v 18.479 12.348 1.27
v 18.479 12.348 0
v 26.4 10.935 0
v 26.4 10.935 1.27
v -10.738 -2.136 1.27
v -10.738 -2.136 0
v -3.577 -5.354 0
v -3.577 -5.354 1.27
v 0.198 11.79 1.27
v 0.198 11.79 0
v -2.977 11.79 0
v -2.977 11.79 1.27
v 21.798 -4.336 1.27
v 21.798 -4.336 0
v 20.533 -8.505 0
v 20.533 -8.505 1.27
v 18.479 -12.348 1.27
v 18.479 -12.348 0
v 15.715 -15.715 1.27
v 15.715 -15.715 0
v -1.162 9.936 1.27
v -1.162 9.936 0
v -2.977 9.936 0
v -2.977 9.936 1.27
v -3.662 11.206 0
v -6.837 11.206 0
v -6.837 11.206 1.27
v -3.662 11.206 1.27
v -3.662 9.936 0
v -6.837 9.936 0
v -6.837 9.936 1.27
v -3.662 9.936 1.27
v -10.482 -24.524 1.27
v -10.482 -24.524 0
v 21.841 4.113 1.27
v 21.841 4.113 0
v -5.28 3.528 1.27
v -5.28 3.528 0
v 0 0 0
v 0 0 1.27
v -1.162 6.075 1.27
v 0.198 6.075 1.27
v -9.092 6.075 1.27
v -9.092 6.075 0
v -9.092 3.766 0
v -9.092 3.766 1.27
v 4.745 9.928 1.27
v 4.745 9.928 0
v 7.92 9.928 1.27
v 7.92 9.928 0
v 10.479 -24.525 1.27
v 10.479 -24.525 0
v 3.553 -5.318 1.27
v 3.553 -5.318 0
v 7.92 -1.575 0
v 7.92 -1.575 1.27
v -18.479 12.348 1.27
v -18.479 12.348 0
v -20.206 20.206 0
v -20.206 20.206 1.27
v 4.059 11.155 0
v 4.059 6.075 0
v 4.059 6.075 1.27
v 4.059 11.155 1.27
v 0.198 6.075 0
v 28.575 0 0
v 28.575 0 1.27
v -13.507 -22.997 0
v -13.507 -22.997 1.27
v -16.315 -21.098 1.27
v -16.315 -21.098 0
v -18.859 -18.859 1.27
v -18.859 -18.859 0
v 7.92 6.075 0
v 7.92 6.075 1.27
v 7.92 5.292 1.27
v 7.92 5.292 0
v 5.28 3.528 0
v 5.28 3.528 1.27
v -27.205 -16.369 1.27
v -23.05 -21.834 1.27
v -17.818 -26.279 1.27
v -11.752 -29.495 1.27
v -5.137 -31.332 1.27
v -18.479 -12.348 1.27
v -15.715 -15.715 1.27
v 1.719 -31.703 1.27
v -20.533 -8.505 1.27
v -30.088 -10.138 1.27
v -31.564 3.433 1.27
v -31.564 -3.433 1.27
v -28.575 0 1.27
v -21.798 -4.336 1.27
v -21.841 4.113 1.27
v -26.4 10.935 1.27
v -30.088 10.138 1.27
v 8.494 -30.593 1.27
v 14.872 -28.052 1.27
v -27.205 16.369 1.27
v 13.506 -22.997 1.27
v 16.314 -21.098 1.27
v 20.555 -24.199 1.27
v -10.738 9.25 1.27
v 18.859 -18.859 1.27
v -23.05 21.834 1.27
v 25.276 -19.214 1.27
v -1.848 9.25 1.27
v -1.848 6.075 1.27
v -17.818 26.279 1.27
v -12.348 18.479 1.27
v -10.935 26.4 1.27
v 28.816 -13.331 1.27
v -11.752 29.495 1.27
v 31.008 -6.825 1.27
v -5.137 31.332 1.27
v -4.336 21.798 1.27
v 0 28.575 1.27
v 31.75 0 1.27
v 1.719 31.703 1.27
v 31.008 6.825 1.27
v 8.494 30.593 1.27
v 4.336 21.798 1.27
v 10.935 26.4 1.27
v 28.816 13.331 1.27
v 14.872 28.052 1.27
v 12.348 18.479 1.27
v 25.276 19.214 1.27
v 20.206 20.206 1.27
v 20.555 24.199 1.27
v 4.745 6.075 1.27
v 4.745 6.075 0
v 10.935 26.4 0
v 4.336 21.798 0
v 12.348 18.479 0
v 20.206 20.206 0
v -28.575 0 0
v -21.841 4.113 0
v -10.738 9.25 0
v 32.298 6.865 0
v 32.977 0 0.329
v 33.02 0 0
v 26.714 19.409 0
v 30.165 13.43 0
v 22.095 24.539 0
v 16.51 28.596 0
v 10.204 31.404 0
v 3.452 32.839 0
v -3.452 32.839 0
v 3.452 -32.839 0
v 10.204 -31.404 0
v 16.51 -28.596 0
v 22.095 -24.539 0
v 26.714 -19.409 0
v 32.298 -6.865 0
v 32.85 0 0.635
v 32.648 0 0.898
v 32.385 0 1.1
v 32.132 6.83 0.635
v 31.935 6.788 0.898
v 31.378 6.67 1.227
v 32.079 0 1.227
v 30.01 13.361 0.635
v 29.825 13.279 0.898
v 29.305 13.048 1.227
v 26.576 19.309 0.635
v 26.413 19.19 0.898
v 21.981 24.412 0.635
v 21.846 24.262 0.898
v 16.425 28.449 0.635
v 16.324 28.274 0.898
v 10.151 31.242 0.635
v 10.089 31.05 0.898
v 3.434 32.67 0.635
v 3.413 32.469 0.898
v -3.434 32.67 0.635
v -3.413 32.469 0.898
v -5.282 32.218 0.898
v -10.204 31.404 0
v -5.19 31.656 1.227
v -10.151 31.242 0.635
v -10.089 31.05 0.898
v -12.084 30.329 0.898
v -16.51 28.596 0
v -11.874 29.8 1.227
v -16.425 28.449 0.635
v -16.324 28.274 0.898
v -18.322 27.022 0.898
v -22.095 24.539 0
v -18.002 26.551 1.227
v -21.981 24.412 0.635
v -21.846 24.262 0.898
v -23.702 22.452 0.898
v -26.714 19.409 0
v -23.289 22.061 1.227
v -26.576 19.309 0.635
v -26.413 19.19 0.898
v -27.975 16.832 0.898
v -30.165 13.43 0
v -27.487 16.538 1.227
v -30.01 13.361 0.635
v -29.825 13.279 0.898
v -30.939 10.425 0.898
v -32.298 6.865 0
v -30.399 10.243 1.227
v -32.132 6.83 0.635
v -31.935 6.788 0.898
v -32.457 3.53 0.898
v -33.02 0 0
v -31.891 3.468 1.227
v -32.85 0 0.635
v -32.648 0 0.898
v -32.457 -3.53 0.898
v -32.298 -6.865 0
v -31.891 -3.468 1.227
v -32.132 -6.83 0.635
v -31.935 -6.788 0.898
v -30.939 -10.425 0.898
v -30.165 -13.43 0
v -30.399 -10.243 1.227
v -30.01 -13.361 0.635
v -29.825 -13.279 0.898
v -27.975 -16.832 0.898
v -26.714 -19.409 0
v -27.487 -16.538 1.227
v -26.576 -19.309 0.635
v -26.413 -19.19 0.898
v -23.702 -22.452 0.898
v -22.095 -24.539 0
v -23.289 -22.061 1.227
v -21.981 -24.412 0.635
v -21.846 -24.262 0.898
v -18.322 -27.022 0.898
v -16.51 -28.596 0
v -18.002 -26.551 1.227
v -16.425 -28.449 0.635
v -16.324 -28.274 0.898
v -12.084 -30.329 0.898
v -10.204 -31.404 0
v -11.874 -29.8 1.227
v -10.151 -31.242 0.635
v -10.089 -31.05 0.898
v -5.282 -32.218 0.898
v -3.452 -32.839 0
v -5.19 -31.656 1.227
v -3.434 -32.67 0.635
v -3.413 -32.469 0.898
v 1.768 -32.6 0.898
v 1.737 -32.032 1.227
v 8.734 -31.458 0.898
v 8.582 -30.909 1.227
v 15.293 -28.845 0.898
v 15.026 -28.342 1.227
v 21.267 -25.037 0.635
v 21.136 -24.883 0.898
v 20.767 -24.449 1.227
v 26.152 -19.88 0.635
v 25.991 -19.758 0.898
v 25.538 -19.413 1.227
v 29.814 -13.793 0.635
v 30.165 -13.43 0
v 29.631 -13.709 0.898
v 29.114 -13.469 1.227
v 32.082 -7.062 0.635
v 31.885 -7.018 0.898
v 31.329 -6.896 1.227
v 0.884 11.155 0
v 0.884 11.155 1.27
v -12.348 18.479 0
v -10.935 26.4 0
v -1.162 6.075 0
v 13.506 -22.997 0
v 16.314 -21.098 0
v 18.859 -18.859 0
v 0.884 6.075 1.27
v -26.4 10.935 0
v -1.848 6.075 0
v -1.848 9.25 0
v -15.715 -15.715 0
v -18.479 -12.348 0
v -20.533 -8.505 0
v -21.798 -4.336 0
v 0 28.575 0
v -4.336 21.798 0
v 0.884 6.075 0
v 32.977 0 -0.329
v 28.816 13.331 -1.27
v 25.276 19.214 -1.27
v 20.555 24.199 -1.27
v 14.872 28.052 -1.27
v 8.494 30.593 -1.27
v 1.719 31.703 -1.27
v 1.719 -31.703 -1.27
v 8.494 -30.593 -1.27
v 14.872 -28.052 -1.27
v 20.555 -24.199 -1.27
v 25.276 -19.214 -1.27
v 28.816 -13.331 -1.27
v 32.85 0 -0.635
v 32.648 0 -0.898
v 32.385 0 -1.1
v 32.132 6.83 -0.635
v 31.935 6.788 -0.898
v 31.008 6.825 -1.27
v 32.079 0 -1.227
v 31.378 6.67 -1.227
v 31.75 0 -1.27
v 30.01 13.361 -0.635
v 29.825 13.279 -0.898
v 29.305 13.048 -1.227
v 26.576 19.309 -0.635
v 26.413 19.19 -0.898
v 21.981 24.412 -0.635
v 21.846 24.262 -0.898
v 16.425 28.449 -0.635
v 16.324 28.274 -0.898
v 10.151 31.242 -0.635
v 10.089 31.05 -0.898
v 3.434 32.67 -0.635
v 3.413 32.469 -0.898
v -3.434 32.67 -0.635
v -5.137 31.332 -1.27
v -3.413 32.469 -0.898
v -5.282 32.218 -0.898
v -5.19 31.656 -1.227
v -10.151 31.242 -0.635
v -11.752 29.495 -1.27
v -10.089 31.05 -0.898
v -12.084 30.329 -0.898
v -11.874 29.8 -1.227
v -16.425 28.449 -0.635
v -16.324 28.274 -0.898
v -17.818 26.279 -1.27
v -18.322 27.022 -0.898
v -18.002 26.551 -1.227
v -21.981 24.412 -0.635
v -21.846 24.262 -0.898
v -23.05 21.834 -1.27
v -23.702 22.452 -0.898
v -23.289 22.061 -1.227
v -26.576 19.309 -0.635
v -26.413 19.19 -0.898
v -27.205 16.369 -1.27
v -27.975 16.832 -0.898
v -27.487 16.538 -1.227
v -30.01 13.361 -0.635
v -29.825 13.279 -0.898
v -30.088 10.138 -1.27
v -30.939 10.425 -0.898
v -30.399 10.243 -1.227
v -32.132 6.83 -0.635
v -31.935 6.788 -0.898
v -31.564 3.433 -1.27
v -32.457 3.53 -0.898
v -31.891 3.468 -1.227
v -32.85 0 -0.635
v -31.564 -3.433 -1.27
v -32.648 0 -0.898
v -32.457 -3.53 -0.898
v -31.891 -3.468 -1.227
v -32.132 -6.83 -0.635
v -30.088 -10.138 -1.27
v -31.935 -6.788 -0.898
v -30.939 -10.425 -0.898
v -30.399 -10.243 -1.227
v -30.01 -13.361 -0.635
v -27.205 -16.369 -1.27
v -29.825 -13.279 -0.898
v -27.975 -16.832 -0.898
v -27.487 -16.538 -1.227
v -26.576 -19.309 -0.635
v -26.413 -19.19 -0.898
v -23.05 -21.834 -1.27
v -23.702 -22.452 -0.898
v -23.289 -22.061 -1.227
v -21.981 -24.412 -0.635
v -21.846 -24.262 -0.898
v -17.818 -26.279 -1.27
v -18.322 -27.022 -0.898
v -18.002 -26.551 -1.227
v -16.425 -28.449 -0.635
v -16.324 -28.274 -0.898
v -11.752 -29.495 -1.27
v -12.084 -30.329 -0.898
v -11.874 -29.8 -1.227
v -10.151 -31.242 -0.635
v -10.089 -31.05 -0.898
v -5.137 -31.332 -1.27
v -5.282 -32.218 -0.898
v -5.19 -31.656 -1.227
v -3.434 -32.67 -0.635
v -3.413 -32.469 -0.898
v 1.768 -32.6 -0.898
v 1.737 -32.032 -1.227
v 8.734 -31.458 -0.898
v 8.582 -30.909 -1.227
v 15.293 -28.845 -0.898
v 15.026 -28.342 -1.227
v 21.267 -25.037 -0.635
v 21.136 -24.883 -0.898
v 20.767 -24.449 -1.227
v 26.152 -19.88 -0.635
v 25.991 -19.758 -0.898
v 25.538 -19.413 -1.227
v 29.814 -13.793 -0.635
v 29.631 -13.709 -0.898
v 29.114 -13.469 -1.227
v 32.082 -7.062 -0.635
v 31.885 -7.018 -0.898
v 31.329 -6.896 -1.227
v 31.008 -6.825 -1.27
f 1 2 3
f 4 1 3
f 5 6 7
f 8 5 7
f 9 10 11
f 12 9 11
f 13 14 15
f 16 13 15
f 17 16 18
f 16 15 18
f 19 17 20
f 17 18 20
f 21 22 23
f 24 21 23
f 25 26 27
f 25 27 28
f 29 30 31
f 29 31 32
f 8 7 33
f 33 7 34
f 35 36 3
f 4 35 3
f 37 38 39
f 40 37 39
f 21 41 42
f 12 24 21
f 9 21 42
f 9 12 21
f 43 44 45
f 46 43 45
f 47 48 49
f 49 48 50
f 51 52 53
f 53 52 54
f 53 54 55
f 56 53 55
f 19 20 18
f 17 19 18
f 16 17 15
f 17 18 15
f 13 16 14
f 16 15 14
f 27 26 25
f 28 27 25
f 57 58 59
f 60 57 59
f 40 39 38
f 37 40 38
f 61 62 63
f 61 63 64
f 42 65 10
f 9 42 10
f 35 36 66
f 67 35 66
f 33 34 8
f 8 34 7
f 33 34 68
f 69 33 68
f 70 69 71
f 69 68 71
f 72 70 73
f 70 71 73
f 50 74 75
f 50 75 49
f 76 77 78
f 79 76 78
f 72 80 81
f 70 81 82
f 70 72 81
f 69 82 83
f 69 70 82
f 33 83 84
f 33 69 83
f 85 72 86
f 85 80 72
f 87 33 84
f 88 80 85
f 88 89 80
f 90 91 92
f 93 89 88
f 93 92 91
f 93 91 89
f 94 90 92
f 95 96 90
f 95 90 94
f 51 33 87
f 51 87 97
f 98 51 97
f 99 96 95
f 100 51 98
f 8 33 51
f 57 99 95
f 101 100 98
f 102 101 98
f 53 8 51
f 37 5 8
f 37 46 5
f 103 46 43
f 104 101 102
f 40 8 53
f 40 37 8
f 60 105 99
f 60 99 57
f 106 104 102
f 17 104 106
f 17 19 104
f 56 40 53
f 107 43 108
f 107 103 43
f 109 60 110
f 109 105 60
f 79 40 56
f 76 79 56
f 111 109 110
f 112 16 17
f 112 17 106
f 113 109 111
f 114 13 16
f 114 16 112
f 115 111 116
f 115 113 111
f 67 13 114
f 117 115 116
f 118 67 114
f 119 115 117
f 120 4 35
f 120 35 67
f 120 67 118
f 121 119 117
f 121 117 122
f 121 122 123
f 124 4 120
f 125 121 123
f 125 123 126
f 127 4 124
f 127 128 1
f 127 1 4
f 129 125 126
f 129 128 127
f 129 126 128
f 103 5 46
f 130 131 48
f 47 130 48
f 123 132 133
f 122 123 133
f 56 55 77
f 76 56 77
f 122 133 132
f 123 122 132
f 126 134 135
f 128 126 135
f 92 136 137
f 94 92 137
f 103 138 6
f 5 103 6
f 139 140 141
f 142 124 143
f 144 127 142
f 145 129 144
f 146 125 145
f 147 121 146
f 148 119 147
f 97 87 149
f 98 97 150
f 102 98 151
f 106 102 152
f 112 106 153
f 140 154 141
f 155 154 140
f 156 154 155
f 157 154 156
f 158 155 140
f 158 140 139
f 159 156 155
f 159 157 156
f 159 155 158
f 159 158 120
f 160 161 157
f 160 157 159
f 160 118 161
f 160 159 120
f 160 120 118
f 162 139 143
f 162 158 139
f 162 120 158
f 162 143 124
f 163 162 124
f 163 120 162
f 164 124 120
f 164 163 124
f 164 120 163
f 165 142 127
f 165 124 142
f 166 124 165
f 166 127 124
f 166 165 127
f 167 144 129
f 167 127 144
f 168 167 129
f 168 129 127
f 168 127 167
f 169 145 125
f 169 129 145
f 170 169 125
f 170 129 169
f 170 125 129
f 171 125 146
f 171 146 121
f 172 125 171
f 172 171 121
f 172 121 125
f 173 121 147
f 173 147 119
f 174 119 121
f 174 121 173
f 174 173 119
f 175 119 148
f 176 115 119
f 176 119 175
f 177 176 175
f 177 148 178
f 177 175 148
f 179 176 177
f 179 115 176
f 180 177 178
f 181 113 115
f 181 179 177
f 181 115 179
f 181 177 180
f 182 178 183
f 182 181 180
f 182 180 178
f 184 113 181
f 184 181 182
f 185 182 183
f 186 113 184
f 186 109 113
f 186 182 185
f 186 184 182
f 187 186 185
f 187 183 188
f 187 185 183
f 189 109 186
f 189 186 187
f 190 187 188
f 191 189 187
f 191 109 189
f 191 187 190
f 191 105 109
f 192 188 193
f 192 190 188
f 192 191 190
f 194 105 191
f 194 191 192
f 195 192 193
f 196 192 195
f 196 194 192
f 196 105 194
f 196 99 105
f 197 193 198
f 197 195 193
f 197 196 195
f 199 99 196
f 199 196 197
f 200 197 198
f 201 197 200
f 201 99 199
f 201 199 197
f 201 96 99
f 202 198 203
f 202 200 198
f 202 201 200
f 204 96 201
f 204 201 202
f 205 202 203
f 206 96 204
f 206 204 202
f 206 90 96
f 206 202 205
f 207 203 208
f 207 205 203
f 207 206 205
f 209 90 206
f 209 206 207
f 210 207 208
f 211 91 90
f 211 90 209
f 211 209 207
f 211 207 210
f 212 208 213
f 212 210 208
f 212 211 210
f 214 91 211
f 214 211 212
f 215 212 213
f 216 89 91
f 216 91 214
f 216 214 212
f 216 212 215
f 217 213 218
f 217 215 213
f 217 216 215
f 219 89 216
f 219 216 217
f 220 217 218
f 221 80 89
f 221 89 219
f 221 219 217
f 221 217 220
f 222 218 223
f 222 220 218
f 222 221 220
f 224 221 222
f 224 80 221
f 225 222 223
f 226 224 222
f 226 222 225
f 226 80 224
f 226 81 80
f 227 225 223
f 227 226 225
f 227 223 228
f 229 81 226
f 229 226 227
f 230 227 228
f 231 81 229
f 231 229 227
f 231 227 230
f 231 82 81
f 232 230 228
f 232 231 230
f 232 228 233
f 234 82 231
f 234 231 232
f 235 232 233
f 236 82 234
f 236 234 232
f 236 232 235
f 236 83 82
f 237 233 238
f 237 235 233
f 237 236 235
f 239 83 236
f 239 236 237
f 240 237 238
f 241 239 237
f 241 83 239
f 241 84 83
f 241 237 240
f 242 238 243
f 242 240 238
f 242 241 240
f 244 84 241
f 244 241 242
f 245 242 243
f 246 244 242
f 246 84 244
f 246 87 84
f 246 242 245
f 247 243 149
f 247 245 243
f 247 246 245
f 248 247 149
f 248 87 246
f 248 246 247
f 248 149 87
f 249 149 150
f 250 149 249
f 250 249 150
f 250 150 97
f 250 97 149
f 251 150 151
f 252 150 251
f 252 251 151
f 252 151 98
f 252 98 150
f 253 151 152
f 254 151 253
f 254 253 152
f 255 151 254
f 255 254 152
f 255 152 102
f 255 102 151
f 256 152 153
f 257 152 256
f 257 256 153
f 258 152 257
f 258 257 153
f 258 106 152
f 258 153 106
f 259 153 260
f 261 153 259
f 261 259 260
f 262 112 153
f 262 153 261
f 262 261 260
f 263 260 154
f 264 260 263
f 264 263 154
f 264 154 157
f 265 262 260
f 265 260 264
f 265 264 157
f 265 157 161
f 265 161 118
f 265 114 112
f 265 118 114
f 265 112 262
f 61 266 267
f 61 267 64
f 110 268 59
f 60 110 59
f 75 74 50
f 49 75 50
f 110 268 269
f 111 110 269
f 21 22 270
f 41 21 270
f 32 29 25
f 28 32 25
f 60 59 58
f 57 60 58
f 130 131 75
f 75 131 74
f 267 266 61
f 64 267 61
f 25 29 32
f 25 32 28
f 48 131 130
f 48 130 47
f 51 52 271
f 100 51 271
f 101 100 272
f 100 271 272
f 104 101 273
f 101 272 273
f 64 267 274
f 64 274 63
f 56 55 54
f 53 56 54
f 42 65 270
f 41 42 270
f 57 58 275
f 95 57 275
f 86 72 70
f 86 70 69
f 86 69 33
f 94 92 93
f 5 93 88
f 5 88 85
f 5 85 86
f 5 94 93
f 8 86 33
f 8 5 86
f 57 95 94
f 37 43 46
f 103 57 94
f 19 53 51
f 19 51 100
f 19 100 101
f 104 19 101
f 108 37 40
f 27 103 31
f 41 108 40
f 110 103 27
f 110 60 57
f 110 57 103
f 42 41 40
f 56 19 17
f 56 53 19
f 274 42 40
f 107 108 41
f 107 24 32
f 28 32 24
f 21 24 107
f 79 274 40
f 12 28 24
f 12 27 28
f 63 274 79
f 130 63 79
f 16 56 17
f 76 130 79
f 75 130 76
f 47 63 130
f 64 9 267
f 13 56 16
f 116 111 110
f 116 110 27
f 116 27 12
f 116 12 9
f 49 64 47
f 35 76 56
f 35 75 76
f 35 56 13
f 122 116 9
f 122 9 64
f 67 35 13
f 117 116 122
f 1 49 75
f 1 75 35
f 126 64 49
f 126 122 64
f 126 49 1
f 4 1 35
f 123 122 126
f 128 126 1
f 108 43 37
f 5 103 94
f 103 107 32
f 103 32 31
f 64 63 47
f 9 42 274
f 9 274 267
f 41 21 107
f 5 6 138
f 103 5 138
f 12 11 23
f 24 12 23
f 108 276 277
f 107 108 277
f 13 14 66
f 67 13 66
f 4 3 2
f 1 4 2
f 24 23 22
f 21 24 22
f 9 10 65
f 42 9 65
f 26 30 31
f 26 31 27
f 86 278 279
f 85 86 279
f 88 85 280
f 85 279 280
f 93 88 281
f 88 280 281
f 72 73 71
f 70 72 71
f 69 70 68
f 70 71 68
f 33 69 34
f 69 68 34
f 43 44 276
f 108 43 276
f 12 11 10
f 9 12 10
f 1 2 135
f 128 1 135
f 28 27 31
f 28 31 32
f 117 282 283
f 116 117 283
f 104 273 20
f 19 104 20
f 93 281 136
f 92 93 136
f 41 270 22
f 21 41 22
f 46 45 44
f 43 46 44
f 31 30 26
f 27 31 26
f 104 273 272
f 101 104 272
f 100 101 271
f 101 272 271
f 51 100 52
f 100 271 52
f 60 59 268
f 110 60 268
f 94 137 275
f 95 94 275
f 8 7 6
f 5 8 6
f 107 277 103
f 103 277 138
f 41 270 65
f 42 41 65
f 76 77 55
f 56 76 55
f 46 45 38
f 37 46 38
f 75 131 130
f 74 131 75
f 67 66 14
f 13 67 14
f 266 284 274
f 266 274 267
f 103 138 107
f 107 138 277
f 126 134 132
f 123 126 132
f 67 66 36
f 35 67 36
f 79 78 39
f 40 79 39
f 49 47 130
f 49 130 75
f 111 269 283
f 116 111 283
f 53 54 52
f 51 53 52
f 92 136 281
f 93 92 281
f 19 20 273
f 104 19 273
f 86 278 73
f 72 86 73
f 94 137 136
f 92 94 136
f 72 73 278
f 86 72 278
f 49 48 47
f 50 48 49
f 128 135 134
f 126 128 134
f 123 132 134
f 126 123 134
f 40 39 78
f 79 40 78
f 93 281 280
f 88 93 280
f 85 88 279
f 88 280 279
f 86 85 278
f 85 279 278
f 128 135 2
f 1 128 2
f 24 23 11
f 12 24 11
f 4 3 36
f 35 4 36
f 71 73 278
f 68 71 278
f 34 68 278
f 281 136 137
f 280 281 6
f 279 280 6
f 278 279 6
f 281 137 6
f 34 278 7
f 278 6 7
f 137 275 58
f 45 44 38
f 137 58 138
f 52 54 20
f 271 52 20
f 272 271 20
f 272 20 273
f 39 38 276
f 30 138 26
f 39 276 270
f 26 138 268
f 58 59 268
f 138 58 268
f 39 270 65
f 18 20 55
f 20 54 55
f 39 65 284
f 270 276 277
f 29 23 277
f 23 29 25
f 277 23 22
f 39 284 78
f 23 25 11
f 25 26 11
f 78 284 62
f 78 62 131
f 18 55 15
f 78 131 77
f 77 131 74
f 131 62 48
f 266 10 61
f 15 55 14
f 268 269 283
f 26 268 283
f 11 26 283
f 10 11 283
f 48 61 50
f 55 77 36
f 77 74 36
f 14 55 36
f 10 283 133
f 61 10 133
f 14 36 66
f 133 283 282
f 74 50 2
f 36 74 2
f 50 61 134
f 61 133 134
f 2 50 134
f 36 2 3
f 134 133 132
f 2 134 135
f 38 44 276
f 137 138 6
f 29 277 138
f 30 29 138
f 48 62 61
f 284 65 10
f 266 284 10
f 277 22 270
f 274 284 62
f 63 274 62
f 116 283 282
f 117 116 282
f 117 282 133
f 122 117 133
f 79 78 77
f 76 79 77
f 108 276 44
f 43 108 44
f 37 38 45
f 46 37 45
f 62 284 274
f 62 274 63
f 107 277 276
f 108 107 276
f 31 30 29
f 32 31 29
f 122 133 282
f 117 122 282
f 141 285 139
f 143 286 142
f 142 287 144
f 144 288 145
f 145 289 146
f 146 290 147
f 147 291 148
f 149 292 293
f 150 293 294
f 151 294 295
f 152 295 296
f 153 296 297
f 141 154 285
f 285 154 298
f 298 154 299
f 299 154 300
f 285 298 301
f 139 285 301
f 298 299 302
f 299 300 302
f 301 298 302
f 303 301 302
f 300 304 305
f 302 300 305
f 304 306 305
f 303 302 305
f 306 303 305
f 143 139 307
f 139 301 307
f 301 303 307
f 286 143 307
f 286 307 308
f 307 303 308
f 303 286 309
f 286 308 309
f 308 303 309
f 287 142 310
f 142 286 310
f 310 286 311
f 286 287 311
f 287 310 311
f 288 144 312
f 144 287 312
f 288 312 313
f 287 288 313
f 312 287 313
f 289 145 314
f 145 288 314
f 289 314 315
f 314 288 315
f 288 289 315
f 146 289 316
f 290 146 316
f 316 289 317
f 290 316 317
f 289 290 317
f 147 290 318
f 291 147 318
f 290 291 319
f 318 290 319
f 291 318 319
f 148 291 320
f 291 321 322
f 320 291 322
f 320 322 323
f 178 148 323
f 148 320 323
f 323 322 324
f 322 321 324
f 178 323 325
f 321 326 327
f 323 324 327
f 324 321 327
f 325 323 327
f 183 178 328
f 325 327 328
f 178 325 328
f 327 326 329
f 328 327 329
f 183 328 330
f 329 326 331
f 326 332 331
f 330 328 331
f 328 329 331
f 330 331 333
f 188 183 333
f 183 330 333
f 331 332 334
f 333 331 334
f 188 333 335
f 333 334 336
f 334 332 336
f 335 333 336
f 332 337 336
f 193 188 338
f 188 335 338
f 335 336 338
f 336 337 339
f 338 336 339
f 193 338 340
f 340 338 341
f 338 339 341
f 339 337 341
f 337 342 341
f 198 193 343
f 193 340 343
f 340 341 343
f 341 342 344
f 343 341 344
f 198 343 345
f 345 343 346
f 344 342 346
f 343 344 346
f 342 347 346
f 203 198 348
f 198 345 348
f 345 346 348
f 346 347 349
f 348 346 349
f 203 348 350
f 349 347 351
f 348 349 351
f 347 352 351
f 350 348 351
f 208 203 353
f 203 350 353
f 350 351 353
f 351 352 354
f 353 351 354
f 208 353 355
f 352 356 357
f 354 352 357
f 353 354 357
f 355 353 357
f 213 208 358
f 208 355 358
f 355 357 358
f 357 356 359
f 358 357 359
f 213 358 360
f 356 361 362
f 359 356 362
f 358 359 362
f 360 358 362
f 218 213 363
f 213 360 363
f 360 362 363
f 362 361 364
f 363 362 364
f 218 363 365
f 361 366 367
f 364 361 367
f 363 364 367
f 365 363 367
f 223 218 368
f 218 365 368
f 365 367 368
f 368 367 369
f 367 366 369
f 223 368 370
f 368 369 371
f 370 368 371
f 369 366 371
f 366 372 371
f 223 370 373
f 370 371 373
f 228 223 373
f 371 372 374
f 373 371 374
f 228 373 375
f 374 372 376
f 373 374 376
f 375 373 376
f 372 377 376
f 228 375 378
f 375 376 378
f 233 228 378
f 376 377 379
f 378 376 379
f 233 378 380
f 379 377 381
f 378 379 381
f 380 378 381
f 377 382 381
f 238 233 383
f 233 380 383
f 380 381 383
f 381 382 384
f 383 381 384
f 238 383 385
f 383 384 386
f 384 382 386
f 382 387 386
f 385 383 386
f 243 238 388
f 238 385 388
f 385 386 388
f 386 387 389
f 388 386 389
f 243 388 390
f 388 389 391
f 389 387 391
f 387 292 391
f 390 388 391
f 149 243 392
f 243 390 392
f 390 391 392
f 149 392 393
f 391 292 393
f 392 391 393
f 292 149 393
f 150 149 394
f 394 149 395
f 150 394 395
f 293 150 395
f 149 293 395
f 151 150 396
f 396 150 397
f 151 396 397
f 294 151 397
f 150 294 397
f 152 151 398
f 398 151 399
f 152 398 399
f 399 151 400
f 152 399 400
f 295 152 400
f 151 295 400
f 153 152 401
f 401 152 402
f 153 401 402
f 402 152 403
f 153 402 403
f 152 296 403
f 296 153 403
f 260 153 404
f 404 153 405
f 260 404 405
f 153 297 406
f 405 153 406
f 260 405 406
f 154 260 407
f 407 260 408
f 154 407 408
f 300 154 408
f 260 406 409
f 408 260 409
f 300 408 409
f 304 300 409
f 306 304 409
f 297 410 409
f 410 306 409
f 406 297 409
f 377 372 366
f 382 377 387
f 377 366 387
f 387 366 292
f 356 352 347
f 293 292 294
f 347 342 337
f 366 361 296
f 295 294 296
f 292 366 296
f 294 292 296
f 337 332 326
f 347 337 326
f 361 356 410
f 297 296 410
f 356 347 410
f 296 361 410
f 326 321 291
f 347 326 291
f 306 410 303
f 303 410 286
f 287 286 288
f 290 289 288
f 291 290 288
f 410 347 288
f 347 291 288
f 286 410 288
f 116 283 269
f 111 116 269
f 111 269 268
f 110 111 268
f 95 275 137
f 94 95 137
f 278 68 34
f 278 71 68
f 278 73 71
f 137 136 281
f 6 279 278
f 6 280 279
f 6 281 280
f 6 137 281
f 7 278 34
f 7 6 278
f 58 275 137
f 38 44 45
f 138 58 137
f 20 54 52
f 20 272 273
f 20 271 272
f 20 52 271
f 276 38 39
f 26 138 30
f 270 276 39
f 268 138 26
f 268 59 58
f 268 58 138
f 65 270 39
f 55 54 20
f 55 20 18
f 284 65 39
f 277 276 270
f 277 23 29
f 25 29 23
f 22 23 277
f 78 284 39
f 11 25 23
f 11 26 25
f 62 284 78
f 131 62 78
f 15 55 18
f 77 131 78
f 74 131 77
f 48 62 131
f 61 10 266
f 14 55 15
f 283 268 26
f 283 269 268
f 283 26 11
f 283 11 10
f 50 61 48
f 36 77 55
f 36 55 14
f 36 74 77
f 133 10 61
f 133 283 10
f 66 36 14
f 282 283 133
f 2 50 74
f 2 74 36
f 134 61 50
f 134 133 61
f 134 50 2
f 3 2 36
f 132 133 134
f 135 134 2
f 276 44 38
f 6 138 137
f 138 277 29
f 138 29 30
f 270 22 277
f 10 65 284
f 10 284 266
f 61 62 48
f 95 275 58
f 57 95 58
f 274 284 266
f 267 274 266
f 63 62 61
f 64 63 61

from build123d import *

# Parameters (mm, degrees)
F0_R     = 33.02
F1_DEPTH = 1.27
F0_W     = 3.175
F0_H     = 3.8530217187
F0_H_2   = 5.08
F0_H_3   = 1.27
F2_DEPTH = 1.27
F3_DEPTH = 1.27
F4_R     = 1.26999


# Not quite as in the source:
# - a fillet or chamfer is up to 0.001 mm smaller than in the source, because OpenCascade refuses the exact size


with BuildPart() as f1:
    # F0 (on Top) → F1 (new body)
    with BuildSketch(Plane.XY):
        Circle(F0_R)
        with BuildLine():
            Line((-2.9765482984, 6.0750994888), (-1.8481521045, 6.0750994888))
            Line((-1.8481521045, 6.0750994888), (-1.8481521045, 9.2500994888))
            Line((-1.8481521045, 9.2500994888), (-10.7381521045, 9.2500994888))
            Line((-10.7381521045, 9.2500994888), (-10.7381521045, 2.1359512564))
            Line((-10.7381521045, 2.1359512564), (-10.7381521045, 0))
            Line((-10.7381521045, 0), (-10.7381521045, -2.1359512564))
            Line((-10.7381521045, -2.1359512564), (-3.5774542134, -5.3540385915))
            Line((-3.5774542134, -5.3540385915), (-10.4815781743, -24.5239764104))
            ThreePointArc((-10.4815781743, -24.5239764104), (-14.9410475085, -22.0919442184), (-18.8585378542, -18.8585378542))
            Line((-18.8585378542, -18.8585378542), (-15.7154482119, -15.7154482119))
            ThreePointArc((-15.7154482119, -15.7154482119), (-19.6007001001, -10.476792476), (-21.797952857, -4.3358824068))
            Line((-21.797952857, -4.3358824068), (-28.575, 0))
            Line((-28.575, 0), (-21.8411747772, 4.1126280349))
            Line((-21.8411747772, 4.1126280349), (-26.3998576415, 10.9351790798))
            Line((-26.3998576415, 10.9351790798), (-18.4794121334, 12.3475484289))
            Line((-18.4794121334, 12.3475484289), (-20.2055762724, 20.2055762724))
            Line((-20.2055762724, 20.2055762724), (-12.3475484289, 18.4794121334))
            Line((-12.3475484289, 18.4794121334), (-10.9351790798, 26.3998576415))
            Line((-10.9351790798, 26.3998576415), (-4.3358824068, 21.797952857))
            Line((-4.3358824068, 21.797952857), (0, 28.575))
            Line((0, 28.575), (4.3358824068, 21.797952857))
            Line((4.3358824068, 21.797952857), (10.9351790798, 26.3998576415))
            Line((10.9351790798, 26.3998576415), (12.3475484289, 18.4794121334))
            Line((12.3475484289, 18.4794121334), (20.2055762724, 20.2055762724))
            Line((20.2055762724, 20.2055762724), (18.4794121334, 12.3475484289))
            Line((18.4794121334, 12.3475484289), (26.3998576415, 10.9351790798))
            Line((26.3998576415, 10.9351790798), (21.8411747772, 4.1126280349))
            Line((21.8411747772, 4.1126280349), (28.575, 0))
            Line((28.575, 0), (21.797952857, -4.3358824068))
            ThreePointArc((21.797952857, -4.3358824068), (19.6007001001, -10.476792476), (15.7154482119, -15.7154482119))
            Line((15.7154482119, -15.7154482119), (18.8585378542, -18.8585378542))
            ThreePointArc((18.8585378542, -18.8585378542), (14.9400123163, -22.092644296), (10.4792798584, -24.5249585861))
            Line((10.4792798584, -24.5249585861), (3.5532282388, -5.3177818583))
            Line((3.5532282388, -5.3177818583), (7.9197480572, -1.5753358351))
            Line((7.9197480572, -1.5753358351), (7.9197480572, 0))
            Line((7.9197480572, 0), (7.9197480572, 1.5753358351))
            Line((7.9197480572, 1.5753358351), (7.9197480572, 5.2918064695))
            Line((7.9197480572, 5.2918064695), (5.2798320381, 3.5278709797))
            Line((5.2798320381, 3.5278709797), (0, 0))
            Line((0, 0), (-5.2798320381, 3.5278709797))
            Line((-5.2798320381, 3.5278709797), (-9.0920289037, 3.7660416814))
            Line((-9.0920289037, 3.7660416814), (-9.0920289037, 6.0750994888))
            Line((-9.0920289037, 6.0750994888), (-3.6623482984, 6.0750994888))
            Line((-3.6623482984, 6.0750994888), (-2.9765482984, 6.0750994888))
        make_face(mode=Mode.SUBTRACT)
    extrude(amount=F1_DEPTH)



with BuildPart() as f1b:
    # F0 (on Top) → F1, piece 2 (new body)
    with BuildSketch(Plane.XY):
        with Locations((6.3322480572, 8.0016103481)):
            Rectangle(F0_W, F0_H)
    extrude(amount=F1_DEPTH)


with BuildPart() as f1c:
    # F0 (on Top) → F1, piece 3 (new body)
    with BuildSketch(Plane.XY):
        with Locations((2.4717517016, 8.6150994888)):
            Rectangle(F0_W, F0_H_2)
    extrude(amount=F1_DEPTH)


with BuildPart() as f1d:
    # F0 (on Top) → F1, piece 4 (new body)
    with BuildSketch(Plane.XY):
        Polygon((-1.1623521045, 6.0750994888), (0.1984517016, 6.0750994888), (0.1984517016, 11.7900994888), (-2.9765482984, 11.7900994888), (-2.9765482984, 9.9358994888), (-1.1623521045, 9.9358994888), align=None)
    extrude(amount=F1_DEPTH)


with BuildPart() as f1e:
    # F0 (on Top) → F1, piece 5 (new body)
    with BuildSketch(Plane.XY):
        with Locations((-5.2498482984, 10.5708994888)):
            Rectangle(F0_W, F0_H_3)
    extrude(amount=F1_DEPTH)


with BuildPart() as f2:
    # F0 (on Top) → F2 (new body)
    with BuildSketch(Plane.XY):
        with BuildLine():
            Line((-1.8481521045, 9.2500994888), (-1.8481521045, 6.0750994888))
            Line((-1.8481521045, 6.0750994888), (-2.9765482984, 6.0750994888))
            Line((-2.9765482984, 6.0750994888), (-3.6623482984, 6.0750994888))
            Line((-3.6623482984, 6.0750994888), (-9.0920289037, 6.0750994888))
            Line((-9.0920289037, 6.0750994888), (-9.0920289037, 3.7660416814))
            Line((-9.0920289037, 3.7660416814), (-5.2798320381, 3.5278709797))
            Line((-5.2798320381, 3.5278709797), (0, 0))
            Line((0, 0), (5.2798320381, 3.5278709797))
            Line((5.2798320381, 3.5278709797), (7.9197480572, 5.2918064695))
            Line((7.9197480572, 5.2918064695), (7.9197480572, 1.5753358351))
            Line((7.9197480572, 1.5753358351), (7.9197480572, 0))
            Line((7.9197480572, 0), (7.9197480572, -1.5753358351))
            Line((7.9197480572, -1.5753358351), (3.5532282388, -5.3177818583))
            Line((3.5532282388, -5.3177818583), (10.4792798584, -24.5249585861))
            ThreePointArc((10.4792798584, -24.5249585861), (14.9400123163, -22.092644296), (18.8585378542, -18.8585378542))
            Line((18.8585378542, -18.8585378542), (15.7154482119, -15.7154482119))
            ThreePointArc((15.7154482119, -15.7154482119), (19.6007001001, -10.476792476), (21.797952857, -4.3358824068))
            Line((21.797952857, -4.3358824068), (28.575, 0))
            Line((28.575, 0), (21.8411747772, 4.1126280349))
            Line((21.8411747772, 4.1126280349), (26.3998576415, 10.9351790798))
            Line((26.3998576415, 10.9351790798), (18.4794121334, 12.3475484289))
            Line((18.4794121334, 12.3475484289), (20.2055762724, 20.2055762724))
            Line((20.2055762724, 20.2055762724), (12.3475484289, 18.4794121334))
            Line((12.3475484289, 18.4794121334), (10.9351790798, 26.3998576415))
            Line((10.9351790798, 26.3998576415), (4.3358824068, 21.797952857))
            Line((4.3358824068, 21.797952857), (0, 28.575))
            Line((0, 28.575), (-4.3358824068, 21.797952857))
            Line((-4.3358824068, 21.797952857), (-10.9351790798, 26.3998576415))
            Line((-10.9351790798, 26.3998576415), (-12.3475484289, 18.4794121334))
            Line((-12.3475484289, 18.4794121334), (-20.2055762724, 20.2055762724))
            Line((-20.2055762724, 20.2055762724), (-18.4794121334, 12.3475484289))
            Line((-18.4794121334, 12.3475484289), (-26.3998576415, 10.9351790798))
            Line((-26.3998576415, 10.9351790798), (-21.8411747772, 4.1126280349))
            Line((-21.8411747772, 4.1126280349), (-28.575, 0))
            Line((-28.575, 0), (-21.797952857, -4.3358824068))
            ThreePointArc((-21.797952857, -4.3358824068), (-19.6007001001, -10.476792476), (-15.7154482119, -15.7154482119))
            Line((-15.7154482119, -15.7154482119), (-18.8585378542, -18.8585378542))
            ThreePointArc((-18.8585378542, -18.8585378542), (-14.9410475085, -22.0919442184), (-10.4815781743, -24.5239764104))
            Line((-10.4815781743, -24.5239764104), (-3.5774542134, -5.3540385915))
            Line((-3.5774542134, -5.3540385915), (-10.7381521045, -2.1359512564))
            Line((-10.7381521045, -2.1359512564), (-10.7381521045, 0))
            Line((-10.7381521045, 0), (-10.7381521045, 2.1359512564))
            Line((-10.7381521045, 2.1359512564), (-10.7381521045, 9.2500994888))
            Line((-10.7381521045, 9.2500994888), (-1.8481521045, 9.2500994888))
        make_face()
        with Locations((-5.2498482984, 10.5708994888)):
            Rectangle(F0_W, F0_H_3, mode=Mode.SUBTRACT)
        Polygon((0.1984517016, 11.7900994888), (0.1984517016, 6.0750994888), (-1.1623521045, 6.0750994888), (-1.1623521045, 9.9358994888), (-2.9765482984, 9.9358994888), (-2.9765482984, 11.7900994888), align=None, mode=Mode.SUBTRACT)
        with Locations((6.3322480572, 8.0016103481)):
            Rectangle(F0_W, F0_H, mode=Mode.SUBTRACT)
        with Locations((2.4717517016, 8.6150994888)):
            Rectangle(F0_W, F0_H_2, mode=Mode.SUBTRACT)
    extrude(amount=F2_DEPTH)


with BuildPart() as f1_1:
    add(f1.part)

    add(f1b.part)  # F3 merges F1b

    add(f1c.part)  # F3 merges F1c

    add(f1d.part)  # F3 merges F1d

    add(f1e.part)  # F3 merges F1e
    # F0 (on Top) → F3 (join)
    with BuildSketch(Plane.XY):
        Circle(F0_R)
        with BuildLine():
            Line((-2.9765482984, 6.0750994888), (-1.8481521045, 6.0750994888))
            Line((-1.8481521045, 6.0750994888), (-1.8481521045, 9.2500994888))
            Line((-1.8481521045, 9.2500994888), (-10.7381521045, 9.2500994888))
            Line((-10.7381521045, 9.2500994888), (-10.7381521045, 2.1359512564))
            Line((-10.7381521045, 2.1359512564), (-10.7381521045, 0))
            Line((-10.7381521045, 0), (-10.7381521045, -2.1359512564))
            Line((-10.7381521045, -2.1359512564), (-3.5774542134, -5.3540385915))
            Line((-3.5774542134, -5.3540385915), (-10.4815781743, -24.5239764104))
            ThreePointArc((-10.4815781743, -24.5239764104), (-14.9410475085, -22.0919442184), (-18.8585378542, -18.8585378542))
            Line((-18.8585378542, -18.8585378542), (-15.7154482119, -15.7154482119))
            ThreePointArc((-15.7154482119, -15.7154482119), (-19.6007001001, -10.476792476), (-21.797952857, -4.3358824068))
            Line((-21.797952857, -4.3358824068), (-28.575, 0))
            Line((-28.575, 0), (-21.8411747772, 4.1126280349))
            Line((-21.8411747772, 4.1126280349), (-26.3998576415, 10.9351790798))
            Line((-26.3998576415, 10.9351790798), (-18.4794121334, 12.3475484289))
            Line((-18.4794121334, 12.3475484289), (-20.2055762724, 20.2055762724))
            Line((-20.2055762724, 20.2055762724), (-12.3475484289, 18.4794121334))
            Line((-12.3475484289, 18.4794121334), (-10.9351790798, 26.3998576415))
            Line((-10.9351790798, 26.3998576415), (-4.3358824068, 21.797952857))
            Line((-4.3358824068, 21.797952857), (0, 28.575))
            Line((0, 28.575), (4.3358824068, 21.797952857))
            Line((4.3358824068, 21.797952857), (10.9351790798, 26.3998576415))
            Line((10.9351790798, 26.3998576415), (12.3475484289, 18.4794121334))
            Line((12.3475484289, 18.4794121334), (20.2055762724, 20.2055762724))
            Line((20.2055762724, 20.2055762724), (18.4794121334, 12.3475484289))
            Line((18.4794121334, 12.3475484289), (26.3998576415, 10.9351790798))
            Line((26.3998576415, 10.9351790798), (21.8411747772, 4.1126280349))
            Line((21.8411747772, 4.1126280349), (28.575, 0))
            Line((28.575, 0), (21.797952857, -4.3358824068))
            ThreePointArc((21.797952857, -4.3358824068), (19.6007001001, -10.476792476), (15.7154482119, -15.7154482119))
            Line((15.7154482119, -15.7154482119), (18.8585378542, -18.8585378542))
            ThreePointArc((18.8585378542, -18.8585378542), (14.9400123163, -22.092644296), (10.4792798584, -24.5249585861))
            Line((10.4792798584, -24.5249585861), (3.5532282388, -5.3177818583))
            Line((3.5532282388, -5.3177818583), (7.9197480572, -1.5753358351))
            Line((7.9197480572, -1.5753358351), (7.9197480572, 0))
            Line((7.9197480572, 0), (7.9197480572, 1.5753358351))
            Line((7.9197480572, 1.5753358351), (7.9197480572, 5.2918064695))
            Line((7.9197480572, 5.2918064695), (5.2798320381, 3.5278709797))
            Line((5.2798320381, 3.5278709797), (0, 0))
            Line((0, 0), (-5.2798320381, 3.5278709797))
            Line((-5.2798320381, 3.5278709797), (-9.0920289037, 3.7660416814))
            Line((-9.0920289037, 3.7660416814), (-9.0920289037, 6.0750994888))
            Line((-9.0920289037, 6.0750994888), (-3.6623482984, 6.0750994888))
            Line((-3.6623482984, 6.0750994888), (-2.9765482984, 6.0750994888))
        make_face(mode=Mode.SUBTRACT)
        with BuildLine():
            Line((-1.8481521045, 9.2500994888), (-1.8481521045, 6.0750994888))
            Line((-1.8481521045, 6.0750994888), (-2.9765482984, 6.0750994888))
            Line((-2.9765482984, 6.0750994888), (-3.6623482984, 6.0750994888))
            Line((-3.6623482984, 6.0750994888), (-9.0920289037, 6.0750994888))
            Line((-9.0920289037, 6.0750994888), (-9.0920289037, 3.7660416814))
            Line((-9.0920289037, 3.7660416814), (-5.2798320381, 3.5278709797))
            Line((-5.2798320381, 3.5278709797), (0, 0))
            Line((0, 0), (5.2798320381, 3.5278709797))
            Line((5.2798320381, 3.5278709797), (7.9197480572, 5.2918064695))
            Line((7.9197480572, 5.2918064695), (7.9197480572, 1.5753358351))
            Line((7.9197480572, 1.5753358351), (7.9197480572, 0))
            Line((7.9197480572, 0), (7.9197480572, -1.5753358351))
            Line((7.9197480572, -1.5753358351), (3.5532282388, -5.3177818583))
            Line((3.5532282388, -5.3177818583), (10.4792798584, -24.5249585861))
            ThreePointArc((10.4792798584, -24.5249585861), (14.9400123163, -22.092644296), (18.8585378542, -18.8585378542))
            Line((18.8585378542, -18.8585378542), (15.7154482119, -15.7154482119))
            ThreePointArc((15.7154482119, -15.7154482119), (19.6007001001, -10.476792476), (21.797952857, -4.3358824068))
            Line((21.797952857, -4.3358824068), (28.575, 0))
            Line((28.575, 0), (21.8411747772, 4.1126280349))
            Line((21.8411747772, 4.1126280349), (26.3998576415, 10.9351790798))
            Line((26.3998576415, 10.9351790798), (18.4794121334, 12.3475484289))
            Line((18.4794121334, 12.3475484289), (20.2055762724, 20.2055762724))
            Line((20.2055762724, 20.2055762724), (12.3475484289, 18.4794121334))
            Line((12.3475484289, 18.4794121334), (10.9351790798, 26.3998576415))
            Line((10.9351790798, 26.3998576415), (4.3358824068, 21.797952857))
            Line((4.3358824068, 21.797952857), (0, 28.575))
            Line((0, 28.575), (-4.3358824068, 21.797952857))
            Line((-4.3358824068, 21.797952857), (-10.9351790798, 26.3998576415))
            Line((-10.9351790798, 26.3998576415), (-12.3475484289, 18.4794121334))
            Line((-12.3475484289, 18.4794121334), (-20.2055762724, 20.2055762724))
            Line((-20.2055762724, 20.2055762724), (-18.4794121334, 12.3475484289))
            Line((-18.4794121334, 12.3475484289), (-26.3998576415, 10.9351790798))
            Line((-26.3998576415, 10.9351790798), (-21.8411747772, 4.1126280349))
            Line((-21.8411747772, 4.1126280349), (-28.575, 0))
            Line((-28.575, 0), (-21.797952857, -4.3358824068))
            ThreePointArc((-21.797952857, -4.3358824068), (-19.6007001001, -10.476792476), (-15.7154482119, -15.7154482119))
            Line((-15.7154482119, -15.7154482119), (-18.8585378542, -18.8585378542))
            ThreePointArc((-18.8585378542, -18.8585378542), (-14.9410475085, -22.0919442184), (-10.4815781743, -24.5239764104))
            Line((-10.4815781743, -24.5239764104), (-3.5774542134, -5.3540385915))
            Line((-3.5774542134, -5.3540385915), (-10.7381521045, -2.1359512564))
            Line((-10.7381521045, -2.1359512564), (-10.7381521045, 0))
            Line((-10.7381521045, 0), (-10.7381521045, 2.1359512564))
            Line((-10.7381521045, 2.1359512564), (-10.7381521045, 9.2500994888))
            Line((-10.7381521045, 9.2500994888), (-1.8481521045, 9.2500994888))
        make_face()
        with Locations((-5.2498482984, 10.5708994888)):
            Rectangle(F0_W, F0_H_3, mode=Mode.SUBTRACT)
        Polygon((0.1984517016, 11.7900994888), (0.1984517016, 6.0750994888), (-1.1623521045, 6.0750994888), (-1.1623521045, 9.9358994888), (-2.9765482984, 9.9358994888), (-2.9765482984, 11.7900994888), align=None, mode=Mode.SUBTRACT)
        with Locations((6.3322480572, 8.0016103481)):
            Rectangle(F0_W, F0_H, mode=Mode.SUBTRACT)
        with Locations((2.4717517016, 8.6150994888)):
            Rectangle(F0_W, F0_H_2, mode=Mode.SUBTRACT)
        with Locations((6.3322480572, 8.0016103481)):
            Rectangle(F0_W, F0_H)
        with Locations((2.4717517016, 8.6150994888)):
            Rectangle(F0_W, F0_H_2)
        Polygon((-1.1623521045, 6.0750994888), (0.1984517016, 6.0750994888), (0.1984517016, 11.7900994888), (-2.9765482984, 11.7900994888), (-2.9765482984, 9.9358994888), (-1.1623521045, 9.9358994888), align=None)
        with Locations((-5.2498482984, 10.5708994888)):
            Rectangle(F0_W, F0_H_3)
    extrude(amount=-F3_DEPTH)

    # F4 (radius 1.27 in the source; OpenCascade refuses exactly that, so slightly less here)
    f4_edges = [f1_1.edges().sort_by_distance(p)[0] for p in [
        (33.02, 0, 0.635),
        (-33.02, 0, 0),
        (-33.02, 0, 1.27),
        (-33.02, 0, -1.27),
    ]]
    fillet(f4_edges, radius=F4_R)


solid = Compound([f2.part, f1_1.part])
